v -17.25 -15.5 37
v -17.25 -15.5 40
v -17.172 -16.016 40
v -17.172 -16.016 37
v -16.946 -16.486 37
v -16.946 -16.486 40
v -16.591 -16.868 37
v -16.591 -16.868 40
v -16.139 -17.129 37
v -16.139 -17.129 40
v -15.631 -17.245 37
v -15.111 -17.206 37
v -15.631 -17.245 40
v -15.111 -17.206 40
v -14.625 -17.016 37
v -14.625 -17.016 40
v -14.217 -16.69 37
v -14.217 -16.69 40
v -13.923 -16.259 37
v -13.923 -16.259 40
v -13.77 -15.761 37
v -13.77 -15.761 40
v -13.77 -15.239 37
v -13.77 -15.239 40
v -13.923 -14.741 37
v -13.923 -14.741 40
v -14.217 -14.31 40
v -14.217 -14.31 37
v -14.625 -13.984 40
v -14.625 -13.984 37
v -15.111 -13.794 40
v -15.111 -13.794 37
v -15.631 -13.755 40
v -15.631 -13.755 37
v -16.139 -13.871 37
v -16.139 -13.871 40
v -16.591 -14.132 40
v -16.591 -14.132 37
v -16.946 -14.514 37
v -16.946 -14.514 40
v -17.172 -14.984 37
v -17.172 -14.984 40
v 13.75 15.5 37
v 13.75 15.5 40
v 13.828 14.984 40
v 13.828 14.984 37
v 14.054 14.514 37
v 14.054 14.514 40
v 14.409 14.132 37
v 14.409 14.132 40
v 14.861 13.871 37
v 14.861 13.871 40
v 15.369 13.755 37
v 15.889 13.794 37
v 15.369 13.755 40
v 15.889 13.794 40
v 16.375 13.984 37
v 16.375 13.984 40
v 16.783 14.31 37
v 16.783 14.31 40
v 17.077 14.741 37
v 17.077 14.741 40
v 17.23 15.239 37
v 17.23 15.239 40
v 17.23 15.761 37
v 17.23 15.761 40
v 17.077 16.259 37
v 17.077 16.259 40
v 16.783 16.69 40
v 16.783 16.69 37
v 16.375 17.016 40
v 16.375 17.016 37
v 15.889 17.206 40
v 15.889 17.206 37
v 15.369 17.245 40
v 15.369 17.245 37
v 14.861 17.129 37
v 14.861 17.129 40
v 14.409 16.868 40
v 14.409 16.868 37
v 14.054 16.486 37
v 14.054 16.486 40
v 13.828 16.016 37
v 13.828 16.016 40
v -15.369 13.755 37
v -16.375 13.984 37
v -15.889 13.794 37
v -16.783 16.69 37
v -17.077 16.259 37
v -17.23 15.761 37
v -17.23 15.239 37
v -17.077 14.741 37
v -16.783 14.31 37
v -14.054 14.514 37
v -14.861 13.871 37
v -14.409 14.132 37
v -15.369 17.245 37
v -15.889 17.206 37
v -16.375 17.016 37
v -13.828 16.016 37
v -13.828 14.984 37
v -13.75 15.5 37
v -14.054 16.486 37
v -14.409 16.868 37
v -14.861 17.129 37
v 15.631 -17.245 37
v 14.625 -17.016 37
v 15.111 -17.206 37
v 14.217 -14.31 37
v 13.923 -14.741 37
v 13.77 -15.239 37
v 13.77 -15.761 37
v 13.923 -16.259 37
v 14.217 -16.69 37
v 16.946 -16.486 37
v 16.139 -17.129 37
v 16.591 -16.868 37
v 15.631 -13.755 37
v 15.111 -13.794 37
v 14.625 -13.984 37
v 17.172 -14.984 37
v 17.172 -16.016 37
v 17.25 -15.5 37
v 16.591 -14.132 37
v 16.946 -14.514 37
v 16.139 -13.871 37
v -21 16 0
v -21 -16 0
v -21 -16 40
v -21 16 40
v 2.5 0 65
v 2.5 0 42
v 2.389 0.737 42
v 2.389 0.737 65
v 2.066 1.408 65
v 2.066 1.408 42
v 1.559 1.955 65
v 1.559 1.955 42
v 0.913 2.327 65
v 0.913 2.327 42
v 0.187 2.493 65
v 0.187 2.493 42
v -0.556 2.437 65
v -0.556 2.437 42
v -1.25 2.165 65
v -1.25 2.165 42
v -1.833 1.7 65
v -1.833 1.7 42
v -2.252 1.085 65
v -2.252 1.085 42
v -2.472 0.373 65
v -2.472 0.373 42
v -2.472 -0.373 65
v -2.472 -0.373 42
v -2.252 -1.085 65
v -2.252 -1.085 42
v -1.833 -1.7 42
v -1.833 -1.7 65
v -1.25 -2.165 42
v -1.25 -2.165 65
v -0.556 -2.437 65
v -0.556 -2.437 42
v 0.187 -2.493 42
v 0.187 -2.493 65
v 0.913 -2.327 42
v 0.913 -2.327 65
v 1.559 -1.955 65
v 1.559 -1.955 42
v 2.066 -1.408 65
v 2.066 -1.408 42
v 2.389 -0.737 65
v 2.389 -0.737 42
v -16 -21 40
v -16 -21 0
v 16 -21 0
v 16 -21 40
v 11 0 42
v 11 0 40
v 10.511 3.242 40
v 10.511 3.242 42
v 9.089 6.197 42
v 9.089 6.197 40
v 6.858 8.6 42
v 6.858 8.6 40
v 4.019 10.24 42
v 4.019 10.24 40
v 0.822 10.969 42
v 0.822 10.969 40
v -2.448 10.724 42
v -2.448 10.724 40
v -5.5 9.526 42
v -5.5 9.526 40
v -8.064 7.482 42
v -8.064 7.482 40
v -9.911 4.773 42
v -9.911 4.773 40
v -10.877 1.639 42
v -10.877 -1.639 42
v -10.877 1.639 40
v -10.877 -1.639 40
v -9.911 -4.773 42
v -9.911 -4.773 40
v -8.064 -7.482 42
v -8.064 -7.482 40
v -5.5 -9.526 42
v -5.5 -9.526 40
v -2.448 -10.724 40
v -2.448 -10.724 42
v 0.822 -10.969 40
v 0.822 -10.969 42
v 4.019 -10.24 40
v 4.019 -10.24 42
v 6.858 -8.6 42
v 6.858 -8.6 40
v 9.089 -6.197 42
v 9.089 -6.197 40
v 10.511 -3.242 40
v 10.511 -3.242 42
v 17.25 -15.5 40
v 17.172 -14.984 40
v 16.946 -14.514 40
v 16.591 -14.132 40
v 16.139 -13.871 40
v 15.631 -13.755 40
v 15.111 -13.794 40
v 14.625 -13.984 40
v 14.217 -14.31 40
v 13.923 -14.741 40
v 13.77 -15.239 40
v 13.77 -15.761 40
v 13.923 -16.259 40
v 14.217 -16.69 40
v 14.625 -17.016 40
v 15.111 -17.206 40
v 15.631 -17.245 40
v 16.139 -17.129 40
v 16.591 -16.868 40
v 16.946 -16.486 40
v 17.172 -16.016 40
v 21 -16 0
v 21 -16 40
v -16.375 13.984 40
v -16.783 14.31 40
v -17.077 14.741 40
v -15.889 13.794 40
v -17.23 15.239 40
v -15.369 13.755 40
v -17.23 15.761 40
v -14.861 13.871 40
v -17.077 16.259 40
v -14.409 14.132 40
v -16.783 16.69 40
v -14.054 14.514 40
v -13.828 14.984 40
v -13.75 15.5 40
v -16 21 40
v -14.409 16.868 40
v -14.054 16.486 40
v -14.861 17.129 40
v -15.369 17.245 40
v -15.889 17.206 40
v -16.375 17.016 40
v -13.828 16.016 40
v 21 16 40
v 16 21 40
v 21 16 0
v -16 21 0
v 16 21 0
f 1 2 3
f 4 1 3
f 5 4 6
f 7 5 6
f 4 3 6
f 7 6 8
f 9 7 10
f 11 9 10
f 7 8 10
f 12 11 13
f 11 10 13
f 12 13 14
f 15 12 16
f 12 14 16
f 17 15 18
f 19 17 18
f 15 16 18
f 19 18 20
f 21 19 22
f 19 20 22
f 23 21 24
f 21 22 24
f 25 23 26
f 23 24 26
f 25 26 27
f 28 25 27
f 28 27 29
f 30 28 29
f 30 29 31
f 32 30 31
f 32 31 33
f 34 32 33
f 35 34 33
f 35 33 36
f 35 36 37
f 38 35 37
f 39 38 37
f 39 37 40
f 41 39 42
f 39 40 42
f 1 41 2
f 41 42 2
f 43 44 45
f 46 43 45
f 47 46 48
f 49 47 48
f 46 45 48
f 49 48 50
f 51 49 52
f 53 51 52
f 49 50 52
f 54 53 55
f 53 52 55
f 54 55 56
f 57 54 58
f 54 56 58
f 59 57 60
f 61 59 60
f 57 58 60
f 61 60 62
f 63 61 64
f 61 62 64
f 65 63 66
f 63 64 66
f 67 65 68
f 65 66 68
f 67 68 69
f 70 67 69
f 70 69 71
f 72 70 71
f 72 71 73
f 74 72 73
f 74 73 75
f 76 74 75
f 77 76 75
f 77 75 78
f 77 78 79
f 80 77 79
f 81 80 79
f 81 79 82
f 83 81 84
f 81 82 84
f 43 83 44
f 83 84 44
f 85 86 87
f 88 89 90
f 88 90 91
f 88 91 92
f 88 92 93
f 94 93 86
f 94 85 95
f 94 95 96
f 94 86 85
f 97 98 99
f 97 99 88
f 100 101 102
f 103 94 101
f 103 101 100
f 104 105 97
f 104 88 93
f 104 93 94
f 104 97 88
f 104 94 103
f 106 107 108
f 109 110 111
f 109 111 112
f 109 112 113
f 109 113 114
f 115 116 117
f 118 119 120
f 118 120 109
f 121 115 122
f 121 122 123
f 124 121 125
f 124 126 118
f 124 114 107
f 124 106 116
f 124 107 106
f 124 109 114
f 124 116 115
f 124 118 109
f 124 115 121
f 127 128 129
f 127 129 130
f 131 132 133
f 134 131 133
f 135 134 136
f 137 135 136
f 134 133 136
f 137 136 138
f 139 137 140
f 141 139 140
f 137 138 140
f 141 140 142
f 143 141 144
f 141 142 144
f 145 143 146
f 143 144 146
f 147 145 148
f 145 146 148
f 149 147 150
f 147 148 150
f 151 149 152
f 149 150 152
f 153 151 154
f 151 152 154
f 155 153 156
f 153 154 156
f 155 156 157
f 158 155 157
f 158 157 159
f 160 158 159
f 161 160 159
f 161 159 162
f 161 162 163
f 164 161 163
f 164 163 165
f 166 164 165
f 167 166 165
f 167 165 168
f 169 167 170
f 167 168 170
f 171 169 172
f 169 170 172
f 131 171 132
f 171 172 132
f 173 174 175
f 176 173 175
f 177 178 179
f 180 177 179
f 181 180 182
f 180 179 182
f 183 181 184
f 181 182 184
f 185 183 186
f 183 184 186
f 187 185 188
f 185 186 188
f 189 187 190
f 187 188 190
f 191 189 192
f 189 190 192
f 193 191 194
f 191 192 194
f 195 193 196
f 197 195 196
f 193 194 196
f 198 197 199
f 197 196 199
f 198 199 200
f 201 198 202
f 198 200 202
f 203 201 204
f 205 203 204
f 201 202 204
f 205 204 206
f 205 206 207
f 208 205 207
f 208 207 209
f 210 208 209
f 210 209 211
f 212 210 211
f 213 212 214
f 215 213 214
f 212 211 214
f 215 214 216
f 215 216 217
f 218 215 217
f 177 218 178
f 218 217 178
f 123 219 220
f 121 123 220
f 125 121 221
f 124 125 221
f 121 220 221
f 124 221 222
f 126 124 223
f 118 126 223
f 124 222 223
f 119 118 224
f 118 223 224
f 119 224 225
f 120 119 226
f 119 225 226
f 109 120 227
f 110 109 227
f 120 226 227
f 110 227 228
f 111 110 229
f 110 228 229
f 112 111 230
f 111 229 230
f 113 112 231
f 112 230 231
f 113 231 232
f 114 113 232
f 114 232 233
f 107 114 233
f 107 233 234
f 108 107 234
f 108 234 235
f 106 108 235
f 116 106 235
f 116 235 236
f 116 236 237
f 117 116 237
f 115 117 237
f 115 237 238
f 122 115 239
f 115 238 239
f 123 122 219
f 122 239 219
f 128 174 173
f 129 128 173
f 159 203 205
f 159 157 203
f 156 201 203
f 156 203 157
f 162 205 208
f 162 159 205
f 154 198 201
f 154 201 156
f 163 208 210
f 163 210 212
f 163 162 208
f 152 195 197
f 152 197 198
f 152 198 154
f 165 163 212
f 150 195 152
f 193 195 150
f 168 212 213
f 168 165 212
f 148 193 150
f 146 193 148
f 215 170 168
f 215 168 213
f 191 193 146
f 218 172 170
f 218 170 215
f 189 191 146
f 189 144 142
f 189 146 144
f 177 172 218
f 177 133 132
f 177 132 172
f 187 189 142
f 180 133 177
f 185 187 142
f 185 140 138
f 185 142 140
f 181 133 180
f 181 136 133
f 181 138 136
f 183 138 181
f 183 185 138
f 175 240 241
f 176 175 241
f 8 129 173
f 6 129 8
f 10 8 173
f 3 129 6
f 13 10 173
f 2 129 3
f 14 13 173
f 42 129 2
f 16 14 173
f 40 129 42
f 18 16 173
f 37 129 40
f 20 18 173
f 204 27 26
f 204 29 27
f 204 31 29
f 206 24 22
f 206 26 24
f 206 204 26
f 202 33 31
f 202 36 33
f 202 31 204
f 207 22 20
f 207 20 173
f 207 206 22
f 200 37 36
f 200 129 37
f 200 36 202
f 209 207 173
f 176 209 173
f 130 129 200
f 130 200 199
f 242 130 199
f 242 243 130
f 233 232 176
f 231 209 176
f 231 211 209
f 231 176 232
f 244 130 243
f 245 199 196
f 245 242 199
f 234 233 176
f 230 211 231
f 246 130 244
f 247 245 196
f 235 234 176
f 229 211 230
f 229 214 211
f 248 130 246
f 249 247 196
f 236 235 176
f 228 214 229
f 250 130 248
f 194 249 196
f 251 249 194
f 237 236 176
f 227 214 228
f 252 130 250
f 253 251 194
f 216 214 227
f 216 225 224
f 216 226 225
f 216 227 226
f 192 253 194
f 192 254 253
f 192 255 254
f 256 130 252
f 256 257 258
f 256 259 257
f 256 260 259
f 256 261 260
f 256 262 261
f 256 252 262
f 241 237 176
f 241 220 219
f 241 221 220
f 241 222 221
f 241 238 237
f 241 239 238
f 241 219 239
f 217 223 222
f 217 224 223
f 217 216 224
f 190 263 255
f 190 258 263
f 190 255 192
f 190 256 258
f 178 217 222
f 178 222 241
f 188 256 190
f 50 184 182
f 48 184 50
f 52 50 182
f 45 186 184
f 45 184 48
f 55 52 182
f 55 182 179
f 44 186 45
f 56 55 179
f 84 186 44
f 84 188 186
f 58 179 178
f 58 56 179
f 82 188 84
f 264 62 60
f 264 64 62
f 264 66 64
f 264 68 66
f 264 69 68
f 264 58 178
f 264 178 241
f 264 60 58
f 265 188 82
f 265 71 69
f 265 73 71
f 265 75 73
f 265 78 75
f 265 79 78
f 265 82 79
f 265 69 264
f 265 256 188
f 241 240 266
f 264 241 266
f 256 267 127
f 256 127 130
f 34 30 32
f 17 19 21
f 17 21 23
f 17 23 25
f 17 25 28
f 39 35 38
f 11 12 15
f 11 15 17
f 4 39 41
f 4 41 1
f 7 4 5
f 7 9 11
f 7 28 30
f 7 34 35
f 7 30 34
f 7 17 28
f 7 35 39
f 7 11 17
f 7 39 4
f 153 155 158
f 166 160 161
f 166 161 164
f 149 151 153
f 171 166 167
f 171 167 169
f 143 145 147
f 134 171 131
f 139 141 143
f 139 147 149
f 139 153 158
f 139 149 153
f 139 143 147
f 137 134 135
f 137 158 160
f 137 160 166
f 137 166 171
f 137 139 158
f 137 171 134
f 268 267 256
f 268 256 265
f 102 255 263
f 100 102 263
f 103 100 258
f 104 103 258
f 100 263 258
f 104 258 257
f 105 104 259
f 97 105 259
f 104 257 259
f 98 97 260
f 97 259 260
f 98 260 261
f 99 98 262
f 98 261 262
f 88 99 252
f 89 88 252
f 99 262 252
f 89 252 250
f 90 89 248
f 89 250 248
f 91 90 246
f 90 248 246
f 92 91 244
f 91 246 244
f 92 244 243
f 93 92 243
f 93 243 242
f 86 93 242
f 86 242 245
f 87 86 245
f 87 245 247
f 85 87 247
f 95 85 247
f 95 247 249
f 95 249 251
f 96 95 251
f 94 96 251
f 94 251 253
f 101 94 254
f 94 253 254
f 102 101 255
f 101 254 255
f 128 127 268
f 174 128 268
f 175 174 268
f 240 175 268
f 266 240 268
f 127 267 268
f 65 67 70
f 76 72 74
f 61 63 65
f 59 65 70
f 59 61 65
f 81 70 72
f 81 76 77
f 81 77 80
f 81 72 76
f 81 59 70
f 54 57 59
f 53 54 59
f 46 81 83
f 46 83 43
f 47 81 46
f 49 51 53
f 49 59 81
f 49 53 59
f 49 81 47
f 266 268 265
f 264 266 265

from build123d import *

# Parameters (mm, degrees)
SKETCH_1_W          = 42
SKETCH_1_H          = 42
EXTRUDE_1_DEPTH     = 40
CHAMFER_1_SIZE      = 5
SKETCH_2_R          = 11
EXTRUDE_2_DEPTH     = 2
SKETCH_3_R          = 2.5
EXTRUDE_3_DEPTH     = 23
SKETCH_4_R          = 1.75
CUT_EXTRUDE_1_DEPTH = 3


with BuildPart() as part:
    # 草圖1 → 填料-伸長1 (new body)
    with BuildSketch(Plane.XY):
        Rectangle(SKETCH_1_W, SKETCH_1_H)
    extrude(amount=EXTRUDE_1_DEPTH)

    # 導角1
    chamfer_1_edges = [part.edges().sort_by_distance(p)[0] for p in [
        (-21, 21, 20),
        (21, 21, 20),
        (21, -21, 20),
        (-21, -21, 20),
    ]]
    chamfer(chamfer_1_edges, length=CHAMFER_1_SIZE)

    # 草圖2 → 填料-伸長2 (add)
    with BuildSketch(Plane.XY.offset(40)):
        Circle(SKETCH_2_R)
    extrude(amount=EXTRUDE_2_DEPTH)

    # 草圖3 → 填料-伸長3 (add)
    with BuildSketch(Plane.XY.offset(42)):
        Circle(SKETCH_3_R)
    extrude(amount=EXTRUDE_3_DEPTH)

    # 草圖4 → 除料-伸長1 (cut)
    with BuildSketch(Plane.XY.offset(40)):
        with Locations((-15.5, 15.5)):
            Circle(SKETCH_4_R)
        with Locations(Location((-15.5, -15.5, 0), (0, 0, 180))):
            Circle(SKETCH_4_R)
        with Locations((15.5, -15.5)):
            Circle(SKETCH_4_R)
        with Locations(Location((15.5, 15.5, 0), (0, 0, 180))):
            Circle(SKETCH_4_R)
    extrude(amount=-CUT_EXTRUDE_1_DEPTH, mode=Mode.SUBTRACT)


solid = part.part
